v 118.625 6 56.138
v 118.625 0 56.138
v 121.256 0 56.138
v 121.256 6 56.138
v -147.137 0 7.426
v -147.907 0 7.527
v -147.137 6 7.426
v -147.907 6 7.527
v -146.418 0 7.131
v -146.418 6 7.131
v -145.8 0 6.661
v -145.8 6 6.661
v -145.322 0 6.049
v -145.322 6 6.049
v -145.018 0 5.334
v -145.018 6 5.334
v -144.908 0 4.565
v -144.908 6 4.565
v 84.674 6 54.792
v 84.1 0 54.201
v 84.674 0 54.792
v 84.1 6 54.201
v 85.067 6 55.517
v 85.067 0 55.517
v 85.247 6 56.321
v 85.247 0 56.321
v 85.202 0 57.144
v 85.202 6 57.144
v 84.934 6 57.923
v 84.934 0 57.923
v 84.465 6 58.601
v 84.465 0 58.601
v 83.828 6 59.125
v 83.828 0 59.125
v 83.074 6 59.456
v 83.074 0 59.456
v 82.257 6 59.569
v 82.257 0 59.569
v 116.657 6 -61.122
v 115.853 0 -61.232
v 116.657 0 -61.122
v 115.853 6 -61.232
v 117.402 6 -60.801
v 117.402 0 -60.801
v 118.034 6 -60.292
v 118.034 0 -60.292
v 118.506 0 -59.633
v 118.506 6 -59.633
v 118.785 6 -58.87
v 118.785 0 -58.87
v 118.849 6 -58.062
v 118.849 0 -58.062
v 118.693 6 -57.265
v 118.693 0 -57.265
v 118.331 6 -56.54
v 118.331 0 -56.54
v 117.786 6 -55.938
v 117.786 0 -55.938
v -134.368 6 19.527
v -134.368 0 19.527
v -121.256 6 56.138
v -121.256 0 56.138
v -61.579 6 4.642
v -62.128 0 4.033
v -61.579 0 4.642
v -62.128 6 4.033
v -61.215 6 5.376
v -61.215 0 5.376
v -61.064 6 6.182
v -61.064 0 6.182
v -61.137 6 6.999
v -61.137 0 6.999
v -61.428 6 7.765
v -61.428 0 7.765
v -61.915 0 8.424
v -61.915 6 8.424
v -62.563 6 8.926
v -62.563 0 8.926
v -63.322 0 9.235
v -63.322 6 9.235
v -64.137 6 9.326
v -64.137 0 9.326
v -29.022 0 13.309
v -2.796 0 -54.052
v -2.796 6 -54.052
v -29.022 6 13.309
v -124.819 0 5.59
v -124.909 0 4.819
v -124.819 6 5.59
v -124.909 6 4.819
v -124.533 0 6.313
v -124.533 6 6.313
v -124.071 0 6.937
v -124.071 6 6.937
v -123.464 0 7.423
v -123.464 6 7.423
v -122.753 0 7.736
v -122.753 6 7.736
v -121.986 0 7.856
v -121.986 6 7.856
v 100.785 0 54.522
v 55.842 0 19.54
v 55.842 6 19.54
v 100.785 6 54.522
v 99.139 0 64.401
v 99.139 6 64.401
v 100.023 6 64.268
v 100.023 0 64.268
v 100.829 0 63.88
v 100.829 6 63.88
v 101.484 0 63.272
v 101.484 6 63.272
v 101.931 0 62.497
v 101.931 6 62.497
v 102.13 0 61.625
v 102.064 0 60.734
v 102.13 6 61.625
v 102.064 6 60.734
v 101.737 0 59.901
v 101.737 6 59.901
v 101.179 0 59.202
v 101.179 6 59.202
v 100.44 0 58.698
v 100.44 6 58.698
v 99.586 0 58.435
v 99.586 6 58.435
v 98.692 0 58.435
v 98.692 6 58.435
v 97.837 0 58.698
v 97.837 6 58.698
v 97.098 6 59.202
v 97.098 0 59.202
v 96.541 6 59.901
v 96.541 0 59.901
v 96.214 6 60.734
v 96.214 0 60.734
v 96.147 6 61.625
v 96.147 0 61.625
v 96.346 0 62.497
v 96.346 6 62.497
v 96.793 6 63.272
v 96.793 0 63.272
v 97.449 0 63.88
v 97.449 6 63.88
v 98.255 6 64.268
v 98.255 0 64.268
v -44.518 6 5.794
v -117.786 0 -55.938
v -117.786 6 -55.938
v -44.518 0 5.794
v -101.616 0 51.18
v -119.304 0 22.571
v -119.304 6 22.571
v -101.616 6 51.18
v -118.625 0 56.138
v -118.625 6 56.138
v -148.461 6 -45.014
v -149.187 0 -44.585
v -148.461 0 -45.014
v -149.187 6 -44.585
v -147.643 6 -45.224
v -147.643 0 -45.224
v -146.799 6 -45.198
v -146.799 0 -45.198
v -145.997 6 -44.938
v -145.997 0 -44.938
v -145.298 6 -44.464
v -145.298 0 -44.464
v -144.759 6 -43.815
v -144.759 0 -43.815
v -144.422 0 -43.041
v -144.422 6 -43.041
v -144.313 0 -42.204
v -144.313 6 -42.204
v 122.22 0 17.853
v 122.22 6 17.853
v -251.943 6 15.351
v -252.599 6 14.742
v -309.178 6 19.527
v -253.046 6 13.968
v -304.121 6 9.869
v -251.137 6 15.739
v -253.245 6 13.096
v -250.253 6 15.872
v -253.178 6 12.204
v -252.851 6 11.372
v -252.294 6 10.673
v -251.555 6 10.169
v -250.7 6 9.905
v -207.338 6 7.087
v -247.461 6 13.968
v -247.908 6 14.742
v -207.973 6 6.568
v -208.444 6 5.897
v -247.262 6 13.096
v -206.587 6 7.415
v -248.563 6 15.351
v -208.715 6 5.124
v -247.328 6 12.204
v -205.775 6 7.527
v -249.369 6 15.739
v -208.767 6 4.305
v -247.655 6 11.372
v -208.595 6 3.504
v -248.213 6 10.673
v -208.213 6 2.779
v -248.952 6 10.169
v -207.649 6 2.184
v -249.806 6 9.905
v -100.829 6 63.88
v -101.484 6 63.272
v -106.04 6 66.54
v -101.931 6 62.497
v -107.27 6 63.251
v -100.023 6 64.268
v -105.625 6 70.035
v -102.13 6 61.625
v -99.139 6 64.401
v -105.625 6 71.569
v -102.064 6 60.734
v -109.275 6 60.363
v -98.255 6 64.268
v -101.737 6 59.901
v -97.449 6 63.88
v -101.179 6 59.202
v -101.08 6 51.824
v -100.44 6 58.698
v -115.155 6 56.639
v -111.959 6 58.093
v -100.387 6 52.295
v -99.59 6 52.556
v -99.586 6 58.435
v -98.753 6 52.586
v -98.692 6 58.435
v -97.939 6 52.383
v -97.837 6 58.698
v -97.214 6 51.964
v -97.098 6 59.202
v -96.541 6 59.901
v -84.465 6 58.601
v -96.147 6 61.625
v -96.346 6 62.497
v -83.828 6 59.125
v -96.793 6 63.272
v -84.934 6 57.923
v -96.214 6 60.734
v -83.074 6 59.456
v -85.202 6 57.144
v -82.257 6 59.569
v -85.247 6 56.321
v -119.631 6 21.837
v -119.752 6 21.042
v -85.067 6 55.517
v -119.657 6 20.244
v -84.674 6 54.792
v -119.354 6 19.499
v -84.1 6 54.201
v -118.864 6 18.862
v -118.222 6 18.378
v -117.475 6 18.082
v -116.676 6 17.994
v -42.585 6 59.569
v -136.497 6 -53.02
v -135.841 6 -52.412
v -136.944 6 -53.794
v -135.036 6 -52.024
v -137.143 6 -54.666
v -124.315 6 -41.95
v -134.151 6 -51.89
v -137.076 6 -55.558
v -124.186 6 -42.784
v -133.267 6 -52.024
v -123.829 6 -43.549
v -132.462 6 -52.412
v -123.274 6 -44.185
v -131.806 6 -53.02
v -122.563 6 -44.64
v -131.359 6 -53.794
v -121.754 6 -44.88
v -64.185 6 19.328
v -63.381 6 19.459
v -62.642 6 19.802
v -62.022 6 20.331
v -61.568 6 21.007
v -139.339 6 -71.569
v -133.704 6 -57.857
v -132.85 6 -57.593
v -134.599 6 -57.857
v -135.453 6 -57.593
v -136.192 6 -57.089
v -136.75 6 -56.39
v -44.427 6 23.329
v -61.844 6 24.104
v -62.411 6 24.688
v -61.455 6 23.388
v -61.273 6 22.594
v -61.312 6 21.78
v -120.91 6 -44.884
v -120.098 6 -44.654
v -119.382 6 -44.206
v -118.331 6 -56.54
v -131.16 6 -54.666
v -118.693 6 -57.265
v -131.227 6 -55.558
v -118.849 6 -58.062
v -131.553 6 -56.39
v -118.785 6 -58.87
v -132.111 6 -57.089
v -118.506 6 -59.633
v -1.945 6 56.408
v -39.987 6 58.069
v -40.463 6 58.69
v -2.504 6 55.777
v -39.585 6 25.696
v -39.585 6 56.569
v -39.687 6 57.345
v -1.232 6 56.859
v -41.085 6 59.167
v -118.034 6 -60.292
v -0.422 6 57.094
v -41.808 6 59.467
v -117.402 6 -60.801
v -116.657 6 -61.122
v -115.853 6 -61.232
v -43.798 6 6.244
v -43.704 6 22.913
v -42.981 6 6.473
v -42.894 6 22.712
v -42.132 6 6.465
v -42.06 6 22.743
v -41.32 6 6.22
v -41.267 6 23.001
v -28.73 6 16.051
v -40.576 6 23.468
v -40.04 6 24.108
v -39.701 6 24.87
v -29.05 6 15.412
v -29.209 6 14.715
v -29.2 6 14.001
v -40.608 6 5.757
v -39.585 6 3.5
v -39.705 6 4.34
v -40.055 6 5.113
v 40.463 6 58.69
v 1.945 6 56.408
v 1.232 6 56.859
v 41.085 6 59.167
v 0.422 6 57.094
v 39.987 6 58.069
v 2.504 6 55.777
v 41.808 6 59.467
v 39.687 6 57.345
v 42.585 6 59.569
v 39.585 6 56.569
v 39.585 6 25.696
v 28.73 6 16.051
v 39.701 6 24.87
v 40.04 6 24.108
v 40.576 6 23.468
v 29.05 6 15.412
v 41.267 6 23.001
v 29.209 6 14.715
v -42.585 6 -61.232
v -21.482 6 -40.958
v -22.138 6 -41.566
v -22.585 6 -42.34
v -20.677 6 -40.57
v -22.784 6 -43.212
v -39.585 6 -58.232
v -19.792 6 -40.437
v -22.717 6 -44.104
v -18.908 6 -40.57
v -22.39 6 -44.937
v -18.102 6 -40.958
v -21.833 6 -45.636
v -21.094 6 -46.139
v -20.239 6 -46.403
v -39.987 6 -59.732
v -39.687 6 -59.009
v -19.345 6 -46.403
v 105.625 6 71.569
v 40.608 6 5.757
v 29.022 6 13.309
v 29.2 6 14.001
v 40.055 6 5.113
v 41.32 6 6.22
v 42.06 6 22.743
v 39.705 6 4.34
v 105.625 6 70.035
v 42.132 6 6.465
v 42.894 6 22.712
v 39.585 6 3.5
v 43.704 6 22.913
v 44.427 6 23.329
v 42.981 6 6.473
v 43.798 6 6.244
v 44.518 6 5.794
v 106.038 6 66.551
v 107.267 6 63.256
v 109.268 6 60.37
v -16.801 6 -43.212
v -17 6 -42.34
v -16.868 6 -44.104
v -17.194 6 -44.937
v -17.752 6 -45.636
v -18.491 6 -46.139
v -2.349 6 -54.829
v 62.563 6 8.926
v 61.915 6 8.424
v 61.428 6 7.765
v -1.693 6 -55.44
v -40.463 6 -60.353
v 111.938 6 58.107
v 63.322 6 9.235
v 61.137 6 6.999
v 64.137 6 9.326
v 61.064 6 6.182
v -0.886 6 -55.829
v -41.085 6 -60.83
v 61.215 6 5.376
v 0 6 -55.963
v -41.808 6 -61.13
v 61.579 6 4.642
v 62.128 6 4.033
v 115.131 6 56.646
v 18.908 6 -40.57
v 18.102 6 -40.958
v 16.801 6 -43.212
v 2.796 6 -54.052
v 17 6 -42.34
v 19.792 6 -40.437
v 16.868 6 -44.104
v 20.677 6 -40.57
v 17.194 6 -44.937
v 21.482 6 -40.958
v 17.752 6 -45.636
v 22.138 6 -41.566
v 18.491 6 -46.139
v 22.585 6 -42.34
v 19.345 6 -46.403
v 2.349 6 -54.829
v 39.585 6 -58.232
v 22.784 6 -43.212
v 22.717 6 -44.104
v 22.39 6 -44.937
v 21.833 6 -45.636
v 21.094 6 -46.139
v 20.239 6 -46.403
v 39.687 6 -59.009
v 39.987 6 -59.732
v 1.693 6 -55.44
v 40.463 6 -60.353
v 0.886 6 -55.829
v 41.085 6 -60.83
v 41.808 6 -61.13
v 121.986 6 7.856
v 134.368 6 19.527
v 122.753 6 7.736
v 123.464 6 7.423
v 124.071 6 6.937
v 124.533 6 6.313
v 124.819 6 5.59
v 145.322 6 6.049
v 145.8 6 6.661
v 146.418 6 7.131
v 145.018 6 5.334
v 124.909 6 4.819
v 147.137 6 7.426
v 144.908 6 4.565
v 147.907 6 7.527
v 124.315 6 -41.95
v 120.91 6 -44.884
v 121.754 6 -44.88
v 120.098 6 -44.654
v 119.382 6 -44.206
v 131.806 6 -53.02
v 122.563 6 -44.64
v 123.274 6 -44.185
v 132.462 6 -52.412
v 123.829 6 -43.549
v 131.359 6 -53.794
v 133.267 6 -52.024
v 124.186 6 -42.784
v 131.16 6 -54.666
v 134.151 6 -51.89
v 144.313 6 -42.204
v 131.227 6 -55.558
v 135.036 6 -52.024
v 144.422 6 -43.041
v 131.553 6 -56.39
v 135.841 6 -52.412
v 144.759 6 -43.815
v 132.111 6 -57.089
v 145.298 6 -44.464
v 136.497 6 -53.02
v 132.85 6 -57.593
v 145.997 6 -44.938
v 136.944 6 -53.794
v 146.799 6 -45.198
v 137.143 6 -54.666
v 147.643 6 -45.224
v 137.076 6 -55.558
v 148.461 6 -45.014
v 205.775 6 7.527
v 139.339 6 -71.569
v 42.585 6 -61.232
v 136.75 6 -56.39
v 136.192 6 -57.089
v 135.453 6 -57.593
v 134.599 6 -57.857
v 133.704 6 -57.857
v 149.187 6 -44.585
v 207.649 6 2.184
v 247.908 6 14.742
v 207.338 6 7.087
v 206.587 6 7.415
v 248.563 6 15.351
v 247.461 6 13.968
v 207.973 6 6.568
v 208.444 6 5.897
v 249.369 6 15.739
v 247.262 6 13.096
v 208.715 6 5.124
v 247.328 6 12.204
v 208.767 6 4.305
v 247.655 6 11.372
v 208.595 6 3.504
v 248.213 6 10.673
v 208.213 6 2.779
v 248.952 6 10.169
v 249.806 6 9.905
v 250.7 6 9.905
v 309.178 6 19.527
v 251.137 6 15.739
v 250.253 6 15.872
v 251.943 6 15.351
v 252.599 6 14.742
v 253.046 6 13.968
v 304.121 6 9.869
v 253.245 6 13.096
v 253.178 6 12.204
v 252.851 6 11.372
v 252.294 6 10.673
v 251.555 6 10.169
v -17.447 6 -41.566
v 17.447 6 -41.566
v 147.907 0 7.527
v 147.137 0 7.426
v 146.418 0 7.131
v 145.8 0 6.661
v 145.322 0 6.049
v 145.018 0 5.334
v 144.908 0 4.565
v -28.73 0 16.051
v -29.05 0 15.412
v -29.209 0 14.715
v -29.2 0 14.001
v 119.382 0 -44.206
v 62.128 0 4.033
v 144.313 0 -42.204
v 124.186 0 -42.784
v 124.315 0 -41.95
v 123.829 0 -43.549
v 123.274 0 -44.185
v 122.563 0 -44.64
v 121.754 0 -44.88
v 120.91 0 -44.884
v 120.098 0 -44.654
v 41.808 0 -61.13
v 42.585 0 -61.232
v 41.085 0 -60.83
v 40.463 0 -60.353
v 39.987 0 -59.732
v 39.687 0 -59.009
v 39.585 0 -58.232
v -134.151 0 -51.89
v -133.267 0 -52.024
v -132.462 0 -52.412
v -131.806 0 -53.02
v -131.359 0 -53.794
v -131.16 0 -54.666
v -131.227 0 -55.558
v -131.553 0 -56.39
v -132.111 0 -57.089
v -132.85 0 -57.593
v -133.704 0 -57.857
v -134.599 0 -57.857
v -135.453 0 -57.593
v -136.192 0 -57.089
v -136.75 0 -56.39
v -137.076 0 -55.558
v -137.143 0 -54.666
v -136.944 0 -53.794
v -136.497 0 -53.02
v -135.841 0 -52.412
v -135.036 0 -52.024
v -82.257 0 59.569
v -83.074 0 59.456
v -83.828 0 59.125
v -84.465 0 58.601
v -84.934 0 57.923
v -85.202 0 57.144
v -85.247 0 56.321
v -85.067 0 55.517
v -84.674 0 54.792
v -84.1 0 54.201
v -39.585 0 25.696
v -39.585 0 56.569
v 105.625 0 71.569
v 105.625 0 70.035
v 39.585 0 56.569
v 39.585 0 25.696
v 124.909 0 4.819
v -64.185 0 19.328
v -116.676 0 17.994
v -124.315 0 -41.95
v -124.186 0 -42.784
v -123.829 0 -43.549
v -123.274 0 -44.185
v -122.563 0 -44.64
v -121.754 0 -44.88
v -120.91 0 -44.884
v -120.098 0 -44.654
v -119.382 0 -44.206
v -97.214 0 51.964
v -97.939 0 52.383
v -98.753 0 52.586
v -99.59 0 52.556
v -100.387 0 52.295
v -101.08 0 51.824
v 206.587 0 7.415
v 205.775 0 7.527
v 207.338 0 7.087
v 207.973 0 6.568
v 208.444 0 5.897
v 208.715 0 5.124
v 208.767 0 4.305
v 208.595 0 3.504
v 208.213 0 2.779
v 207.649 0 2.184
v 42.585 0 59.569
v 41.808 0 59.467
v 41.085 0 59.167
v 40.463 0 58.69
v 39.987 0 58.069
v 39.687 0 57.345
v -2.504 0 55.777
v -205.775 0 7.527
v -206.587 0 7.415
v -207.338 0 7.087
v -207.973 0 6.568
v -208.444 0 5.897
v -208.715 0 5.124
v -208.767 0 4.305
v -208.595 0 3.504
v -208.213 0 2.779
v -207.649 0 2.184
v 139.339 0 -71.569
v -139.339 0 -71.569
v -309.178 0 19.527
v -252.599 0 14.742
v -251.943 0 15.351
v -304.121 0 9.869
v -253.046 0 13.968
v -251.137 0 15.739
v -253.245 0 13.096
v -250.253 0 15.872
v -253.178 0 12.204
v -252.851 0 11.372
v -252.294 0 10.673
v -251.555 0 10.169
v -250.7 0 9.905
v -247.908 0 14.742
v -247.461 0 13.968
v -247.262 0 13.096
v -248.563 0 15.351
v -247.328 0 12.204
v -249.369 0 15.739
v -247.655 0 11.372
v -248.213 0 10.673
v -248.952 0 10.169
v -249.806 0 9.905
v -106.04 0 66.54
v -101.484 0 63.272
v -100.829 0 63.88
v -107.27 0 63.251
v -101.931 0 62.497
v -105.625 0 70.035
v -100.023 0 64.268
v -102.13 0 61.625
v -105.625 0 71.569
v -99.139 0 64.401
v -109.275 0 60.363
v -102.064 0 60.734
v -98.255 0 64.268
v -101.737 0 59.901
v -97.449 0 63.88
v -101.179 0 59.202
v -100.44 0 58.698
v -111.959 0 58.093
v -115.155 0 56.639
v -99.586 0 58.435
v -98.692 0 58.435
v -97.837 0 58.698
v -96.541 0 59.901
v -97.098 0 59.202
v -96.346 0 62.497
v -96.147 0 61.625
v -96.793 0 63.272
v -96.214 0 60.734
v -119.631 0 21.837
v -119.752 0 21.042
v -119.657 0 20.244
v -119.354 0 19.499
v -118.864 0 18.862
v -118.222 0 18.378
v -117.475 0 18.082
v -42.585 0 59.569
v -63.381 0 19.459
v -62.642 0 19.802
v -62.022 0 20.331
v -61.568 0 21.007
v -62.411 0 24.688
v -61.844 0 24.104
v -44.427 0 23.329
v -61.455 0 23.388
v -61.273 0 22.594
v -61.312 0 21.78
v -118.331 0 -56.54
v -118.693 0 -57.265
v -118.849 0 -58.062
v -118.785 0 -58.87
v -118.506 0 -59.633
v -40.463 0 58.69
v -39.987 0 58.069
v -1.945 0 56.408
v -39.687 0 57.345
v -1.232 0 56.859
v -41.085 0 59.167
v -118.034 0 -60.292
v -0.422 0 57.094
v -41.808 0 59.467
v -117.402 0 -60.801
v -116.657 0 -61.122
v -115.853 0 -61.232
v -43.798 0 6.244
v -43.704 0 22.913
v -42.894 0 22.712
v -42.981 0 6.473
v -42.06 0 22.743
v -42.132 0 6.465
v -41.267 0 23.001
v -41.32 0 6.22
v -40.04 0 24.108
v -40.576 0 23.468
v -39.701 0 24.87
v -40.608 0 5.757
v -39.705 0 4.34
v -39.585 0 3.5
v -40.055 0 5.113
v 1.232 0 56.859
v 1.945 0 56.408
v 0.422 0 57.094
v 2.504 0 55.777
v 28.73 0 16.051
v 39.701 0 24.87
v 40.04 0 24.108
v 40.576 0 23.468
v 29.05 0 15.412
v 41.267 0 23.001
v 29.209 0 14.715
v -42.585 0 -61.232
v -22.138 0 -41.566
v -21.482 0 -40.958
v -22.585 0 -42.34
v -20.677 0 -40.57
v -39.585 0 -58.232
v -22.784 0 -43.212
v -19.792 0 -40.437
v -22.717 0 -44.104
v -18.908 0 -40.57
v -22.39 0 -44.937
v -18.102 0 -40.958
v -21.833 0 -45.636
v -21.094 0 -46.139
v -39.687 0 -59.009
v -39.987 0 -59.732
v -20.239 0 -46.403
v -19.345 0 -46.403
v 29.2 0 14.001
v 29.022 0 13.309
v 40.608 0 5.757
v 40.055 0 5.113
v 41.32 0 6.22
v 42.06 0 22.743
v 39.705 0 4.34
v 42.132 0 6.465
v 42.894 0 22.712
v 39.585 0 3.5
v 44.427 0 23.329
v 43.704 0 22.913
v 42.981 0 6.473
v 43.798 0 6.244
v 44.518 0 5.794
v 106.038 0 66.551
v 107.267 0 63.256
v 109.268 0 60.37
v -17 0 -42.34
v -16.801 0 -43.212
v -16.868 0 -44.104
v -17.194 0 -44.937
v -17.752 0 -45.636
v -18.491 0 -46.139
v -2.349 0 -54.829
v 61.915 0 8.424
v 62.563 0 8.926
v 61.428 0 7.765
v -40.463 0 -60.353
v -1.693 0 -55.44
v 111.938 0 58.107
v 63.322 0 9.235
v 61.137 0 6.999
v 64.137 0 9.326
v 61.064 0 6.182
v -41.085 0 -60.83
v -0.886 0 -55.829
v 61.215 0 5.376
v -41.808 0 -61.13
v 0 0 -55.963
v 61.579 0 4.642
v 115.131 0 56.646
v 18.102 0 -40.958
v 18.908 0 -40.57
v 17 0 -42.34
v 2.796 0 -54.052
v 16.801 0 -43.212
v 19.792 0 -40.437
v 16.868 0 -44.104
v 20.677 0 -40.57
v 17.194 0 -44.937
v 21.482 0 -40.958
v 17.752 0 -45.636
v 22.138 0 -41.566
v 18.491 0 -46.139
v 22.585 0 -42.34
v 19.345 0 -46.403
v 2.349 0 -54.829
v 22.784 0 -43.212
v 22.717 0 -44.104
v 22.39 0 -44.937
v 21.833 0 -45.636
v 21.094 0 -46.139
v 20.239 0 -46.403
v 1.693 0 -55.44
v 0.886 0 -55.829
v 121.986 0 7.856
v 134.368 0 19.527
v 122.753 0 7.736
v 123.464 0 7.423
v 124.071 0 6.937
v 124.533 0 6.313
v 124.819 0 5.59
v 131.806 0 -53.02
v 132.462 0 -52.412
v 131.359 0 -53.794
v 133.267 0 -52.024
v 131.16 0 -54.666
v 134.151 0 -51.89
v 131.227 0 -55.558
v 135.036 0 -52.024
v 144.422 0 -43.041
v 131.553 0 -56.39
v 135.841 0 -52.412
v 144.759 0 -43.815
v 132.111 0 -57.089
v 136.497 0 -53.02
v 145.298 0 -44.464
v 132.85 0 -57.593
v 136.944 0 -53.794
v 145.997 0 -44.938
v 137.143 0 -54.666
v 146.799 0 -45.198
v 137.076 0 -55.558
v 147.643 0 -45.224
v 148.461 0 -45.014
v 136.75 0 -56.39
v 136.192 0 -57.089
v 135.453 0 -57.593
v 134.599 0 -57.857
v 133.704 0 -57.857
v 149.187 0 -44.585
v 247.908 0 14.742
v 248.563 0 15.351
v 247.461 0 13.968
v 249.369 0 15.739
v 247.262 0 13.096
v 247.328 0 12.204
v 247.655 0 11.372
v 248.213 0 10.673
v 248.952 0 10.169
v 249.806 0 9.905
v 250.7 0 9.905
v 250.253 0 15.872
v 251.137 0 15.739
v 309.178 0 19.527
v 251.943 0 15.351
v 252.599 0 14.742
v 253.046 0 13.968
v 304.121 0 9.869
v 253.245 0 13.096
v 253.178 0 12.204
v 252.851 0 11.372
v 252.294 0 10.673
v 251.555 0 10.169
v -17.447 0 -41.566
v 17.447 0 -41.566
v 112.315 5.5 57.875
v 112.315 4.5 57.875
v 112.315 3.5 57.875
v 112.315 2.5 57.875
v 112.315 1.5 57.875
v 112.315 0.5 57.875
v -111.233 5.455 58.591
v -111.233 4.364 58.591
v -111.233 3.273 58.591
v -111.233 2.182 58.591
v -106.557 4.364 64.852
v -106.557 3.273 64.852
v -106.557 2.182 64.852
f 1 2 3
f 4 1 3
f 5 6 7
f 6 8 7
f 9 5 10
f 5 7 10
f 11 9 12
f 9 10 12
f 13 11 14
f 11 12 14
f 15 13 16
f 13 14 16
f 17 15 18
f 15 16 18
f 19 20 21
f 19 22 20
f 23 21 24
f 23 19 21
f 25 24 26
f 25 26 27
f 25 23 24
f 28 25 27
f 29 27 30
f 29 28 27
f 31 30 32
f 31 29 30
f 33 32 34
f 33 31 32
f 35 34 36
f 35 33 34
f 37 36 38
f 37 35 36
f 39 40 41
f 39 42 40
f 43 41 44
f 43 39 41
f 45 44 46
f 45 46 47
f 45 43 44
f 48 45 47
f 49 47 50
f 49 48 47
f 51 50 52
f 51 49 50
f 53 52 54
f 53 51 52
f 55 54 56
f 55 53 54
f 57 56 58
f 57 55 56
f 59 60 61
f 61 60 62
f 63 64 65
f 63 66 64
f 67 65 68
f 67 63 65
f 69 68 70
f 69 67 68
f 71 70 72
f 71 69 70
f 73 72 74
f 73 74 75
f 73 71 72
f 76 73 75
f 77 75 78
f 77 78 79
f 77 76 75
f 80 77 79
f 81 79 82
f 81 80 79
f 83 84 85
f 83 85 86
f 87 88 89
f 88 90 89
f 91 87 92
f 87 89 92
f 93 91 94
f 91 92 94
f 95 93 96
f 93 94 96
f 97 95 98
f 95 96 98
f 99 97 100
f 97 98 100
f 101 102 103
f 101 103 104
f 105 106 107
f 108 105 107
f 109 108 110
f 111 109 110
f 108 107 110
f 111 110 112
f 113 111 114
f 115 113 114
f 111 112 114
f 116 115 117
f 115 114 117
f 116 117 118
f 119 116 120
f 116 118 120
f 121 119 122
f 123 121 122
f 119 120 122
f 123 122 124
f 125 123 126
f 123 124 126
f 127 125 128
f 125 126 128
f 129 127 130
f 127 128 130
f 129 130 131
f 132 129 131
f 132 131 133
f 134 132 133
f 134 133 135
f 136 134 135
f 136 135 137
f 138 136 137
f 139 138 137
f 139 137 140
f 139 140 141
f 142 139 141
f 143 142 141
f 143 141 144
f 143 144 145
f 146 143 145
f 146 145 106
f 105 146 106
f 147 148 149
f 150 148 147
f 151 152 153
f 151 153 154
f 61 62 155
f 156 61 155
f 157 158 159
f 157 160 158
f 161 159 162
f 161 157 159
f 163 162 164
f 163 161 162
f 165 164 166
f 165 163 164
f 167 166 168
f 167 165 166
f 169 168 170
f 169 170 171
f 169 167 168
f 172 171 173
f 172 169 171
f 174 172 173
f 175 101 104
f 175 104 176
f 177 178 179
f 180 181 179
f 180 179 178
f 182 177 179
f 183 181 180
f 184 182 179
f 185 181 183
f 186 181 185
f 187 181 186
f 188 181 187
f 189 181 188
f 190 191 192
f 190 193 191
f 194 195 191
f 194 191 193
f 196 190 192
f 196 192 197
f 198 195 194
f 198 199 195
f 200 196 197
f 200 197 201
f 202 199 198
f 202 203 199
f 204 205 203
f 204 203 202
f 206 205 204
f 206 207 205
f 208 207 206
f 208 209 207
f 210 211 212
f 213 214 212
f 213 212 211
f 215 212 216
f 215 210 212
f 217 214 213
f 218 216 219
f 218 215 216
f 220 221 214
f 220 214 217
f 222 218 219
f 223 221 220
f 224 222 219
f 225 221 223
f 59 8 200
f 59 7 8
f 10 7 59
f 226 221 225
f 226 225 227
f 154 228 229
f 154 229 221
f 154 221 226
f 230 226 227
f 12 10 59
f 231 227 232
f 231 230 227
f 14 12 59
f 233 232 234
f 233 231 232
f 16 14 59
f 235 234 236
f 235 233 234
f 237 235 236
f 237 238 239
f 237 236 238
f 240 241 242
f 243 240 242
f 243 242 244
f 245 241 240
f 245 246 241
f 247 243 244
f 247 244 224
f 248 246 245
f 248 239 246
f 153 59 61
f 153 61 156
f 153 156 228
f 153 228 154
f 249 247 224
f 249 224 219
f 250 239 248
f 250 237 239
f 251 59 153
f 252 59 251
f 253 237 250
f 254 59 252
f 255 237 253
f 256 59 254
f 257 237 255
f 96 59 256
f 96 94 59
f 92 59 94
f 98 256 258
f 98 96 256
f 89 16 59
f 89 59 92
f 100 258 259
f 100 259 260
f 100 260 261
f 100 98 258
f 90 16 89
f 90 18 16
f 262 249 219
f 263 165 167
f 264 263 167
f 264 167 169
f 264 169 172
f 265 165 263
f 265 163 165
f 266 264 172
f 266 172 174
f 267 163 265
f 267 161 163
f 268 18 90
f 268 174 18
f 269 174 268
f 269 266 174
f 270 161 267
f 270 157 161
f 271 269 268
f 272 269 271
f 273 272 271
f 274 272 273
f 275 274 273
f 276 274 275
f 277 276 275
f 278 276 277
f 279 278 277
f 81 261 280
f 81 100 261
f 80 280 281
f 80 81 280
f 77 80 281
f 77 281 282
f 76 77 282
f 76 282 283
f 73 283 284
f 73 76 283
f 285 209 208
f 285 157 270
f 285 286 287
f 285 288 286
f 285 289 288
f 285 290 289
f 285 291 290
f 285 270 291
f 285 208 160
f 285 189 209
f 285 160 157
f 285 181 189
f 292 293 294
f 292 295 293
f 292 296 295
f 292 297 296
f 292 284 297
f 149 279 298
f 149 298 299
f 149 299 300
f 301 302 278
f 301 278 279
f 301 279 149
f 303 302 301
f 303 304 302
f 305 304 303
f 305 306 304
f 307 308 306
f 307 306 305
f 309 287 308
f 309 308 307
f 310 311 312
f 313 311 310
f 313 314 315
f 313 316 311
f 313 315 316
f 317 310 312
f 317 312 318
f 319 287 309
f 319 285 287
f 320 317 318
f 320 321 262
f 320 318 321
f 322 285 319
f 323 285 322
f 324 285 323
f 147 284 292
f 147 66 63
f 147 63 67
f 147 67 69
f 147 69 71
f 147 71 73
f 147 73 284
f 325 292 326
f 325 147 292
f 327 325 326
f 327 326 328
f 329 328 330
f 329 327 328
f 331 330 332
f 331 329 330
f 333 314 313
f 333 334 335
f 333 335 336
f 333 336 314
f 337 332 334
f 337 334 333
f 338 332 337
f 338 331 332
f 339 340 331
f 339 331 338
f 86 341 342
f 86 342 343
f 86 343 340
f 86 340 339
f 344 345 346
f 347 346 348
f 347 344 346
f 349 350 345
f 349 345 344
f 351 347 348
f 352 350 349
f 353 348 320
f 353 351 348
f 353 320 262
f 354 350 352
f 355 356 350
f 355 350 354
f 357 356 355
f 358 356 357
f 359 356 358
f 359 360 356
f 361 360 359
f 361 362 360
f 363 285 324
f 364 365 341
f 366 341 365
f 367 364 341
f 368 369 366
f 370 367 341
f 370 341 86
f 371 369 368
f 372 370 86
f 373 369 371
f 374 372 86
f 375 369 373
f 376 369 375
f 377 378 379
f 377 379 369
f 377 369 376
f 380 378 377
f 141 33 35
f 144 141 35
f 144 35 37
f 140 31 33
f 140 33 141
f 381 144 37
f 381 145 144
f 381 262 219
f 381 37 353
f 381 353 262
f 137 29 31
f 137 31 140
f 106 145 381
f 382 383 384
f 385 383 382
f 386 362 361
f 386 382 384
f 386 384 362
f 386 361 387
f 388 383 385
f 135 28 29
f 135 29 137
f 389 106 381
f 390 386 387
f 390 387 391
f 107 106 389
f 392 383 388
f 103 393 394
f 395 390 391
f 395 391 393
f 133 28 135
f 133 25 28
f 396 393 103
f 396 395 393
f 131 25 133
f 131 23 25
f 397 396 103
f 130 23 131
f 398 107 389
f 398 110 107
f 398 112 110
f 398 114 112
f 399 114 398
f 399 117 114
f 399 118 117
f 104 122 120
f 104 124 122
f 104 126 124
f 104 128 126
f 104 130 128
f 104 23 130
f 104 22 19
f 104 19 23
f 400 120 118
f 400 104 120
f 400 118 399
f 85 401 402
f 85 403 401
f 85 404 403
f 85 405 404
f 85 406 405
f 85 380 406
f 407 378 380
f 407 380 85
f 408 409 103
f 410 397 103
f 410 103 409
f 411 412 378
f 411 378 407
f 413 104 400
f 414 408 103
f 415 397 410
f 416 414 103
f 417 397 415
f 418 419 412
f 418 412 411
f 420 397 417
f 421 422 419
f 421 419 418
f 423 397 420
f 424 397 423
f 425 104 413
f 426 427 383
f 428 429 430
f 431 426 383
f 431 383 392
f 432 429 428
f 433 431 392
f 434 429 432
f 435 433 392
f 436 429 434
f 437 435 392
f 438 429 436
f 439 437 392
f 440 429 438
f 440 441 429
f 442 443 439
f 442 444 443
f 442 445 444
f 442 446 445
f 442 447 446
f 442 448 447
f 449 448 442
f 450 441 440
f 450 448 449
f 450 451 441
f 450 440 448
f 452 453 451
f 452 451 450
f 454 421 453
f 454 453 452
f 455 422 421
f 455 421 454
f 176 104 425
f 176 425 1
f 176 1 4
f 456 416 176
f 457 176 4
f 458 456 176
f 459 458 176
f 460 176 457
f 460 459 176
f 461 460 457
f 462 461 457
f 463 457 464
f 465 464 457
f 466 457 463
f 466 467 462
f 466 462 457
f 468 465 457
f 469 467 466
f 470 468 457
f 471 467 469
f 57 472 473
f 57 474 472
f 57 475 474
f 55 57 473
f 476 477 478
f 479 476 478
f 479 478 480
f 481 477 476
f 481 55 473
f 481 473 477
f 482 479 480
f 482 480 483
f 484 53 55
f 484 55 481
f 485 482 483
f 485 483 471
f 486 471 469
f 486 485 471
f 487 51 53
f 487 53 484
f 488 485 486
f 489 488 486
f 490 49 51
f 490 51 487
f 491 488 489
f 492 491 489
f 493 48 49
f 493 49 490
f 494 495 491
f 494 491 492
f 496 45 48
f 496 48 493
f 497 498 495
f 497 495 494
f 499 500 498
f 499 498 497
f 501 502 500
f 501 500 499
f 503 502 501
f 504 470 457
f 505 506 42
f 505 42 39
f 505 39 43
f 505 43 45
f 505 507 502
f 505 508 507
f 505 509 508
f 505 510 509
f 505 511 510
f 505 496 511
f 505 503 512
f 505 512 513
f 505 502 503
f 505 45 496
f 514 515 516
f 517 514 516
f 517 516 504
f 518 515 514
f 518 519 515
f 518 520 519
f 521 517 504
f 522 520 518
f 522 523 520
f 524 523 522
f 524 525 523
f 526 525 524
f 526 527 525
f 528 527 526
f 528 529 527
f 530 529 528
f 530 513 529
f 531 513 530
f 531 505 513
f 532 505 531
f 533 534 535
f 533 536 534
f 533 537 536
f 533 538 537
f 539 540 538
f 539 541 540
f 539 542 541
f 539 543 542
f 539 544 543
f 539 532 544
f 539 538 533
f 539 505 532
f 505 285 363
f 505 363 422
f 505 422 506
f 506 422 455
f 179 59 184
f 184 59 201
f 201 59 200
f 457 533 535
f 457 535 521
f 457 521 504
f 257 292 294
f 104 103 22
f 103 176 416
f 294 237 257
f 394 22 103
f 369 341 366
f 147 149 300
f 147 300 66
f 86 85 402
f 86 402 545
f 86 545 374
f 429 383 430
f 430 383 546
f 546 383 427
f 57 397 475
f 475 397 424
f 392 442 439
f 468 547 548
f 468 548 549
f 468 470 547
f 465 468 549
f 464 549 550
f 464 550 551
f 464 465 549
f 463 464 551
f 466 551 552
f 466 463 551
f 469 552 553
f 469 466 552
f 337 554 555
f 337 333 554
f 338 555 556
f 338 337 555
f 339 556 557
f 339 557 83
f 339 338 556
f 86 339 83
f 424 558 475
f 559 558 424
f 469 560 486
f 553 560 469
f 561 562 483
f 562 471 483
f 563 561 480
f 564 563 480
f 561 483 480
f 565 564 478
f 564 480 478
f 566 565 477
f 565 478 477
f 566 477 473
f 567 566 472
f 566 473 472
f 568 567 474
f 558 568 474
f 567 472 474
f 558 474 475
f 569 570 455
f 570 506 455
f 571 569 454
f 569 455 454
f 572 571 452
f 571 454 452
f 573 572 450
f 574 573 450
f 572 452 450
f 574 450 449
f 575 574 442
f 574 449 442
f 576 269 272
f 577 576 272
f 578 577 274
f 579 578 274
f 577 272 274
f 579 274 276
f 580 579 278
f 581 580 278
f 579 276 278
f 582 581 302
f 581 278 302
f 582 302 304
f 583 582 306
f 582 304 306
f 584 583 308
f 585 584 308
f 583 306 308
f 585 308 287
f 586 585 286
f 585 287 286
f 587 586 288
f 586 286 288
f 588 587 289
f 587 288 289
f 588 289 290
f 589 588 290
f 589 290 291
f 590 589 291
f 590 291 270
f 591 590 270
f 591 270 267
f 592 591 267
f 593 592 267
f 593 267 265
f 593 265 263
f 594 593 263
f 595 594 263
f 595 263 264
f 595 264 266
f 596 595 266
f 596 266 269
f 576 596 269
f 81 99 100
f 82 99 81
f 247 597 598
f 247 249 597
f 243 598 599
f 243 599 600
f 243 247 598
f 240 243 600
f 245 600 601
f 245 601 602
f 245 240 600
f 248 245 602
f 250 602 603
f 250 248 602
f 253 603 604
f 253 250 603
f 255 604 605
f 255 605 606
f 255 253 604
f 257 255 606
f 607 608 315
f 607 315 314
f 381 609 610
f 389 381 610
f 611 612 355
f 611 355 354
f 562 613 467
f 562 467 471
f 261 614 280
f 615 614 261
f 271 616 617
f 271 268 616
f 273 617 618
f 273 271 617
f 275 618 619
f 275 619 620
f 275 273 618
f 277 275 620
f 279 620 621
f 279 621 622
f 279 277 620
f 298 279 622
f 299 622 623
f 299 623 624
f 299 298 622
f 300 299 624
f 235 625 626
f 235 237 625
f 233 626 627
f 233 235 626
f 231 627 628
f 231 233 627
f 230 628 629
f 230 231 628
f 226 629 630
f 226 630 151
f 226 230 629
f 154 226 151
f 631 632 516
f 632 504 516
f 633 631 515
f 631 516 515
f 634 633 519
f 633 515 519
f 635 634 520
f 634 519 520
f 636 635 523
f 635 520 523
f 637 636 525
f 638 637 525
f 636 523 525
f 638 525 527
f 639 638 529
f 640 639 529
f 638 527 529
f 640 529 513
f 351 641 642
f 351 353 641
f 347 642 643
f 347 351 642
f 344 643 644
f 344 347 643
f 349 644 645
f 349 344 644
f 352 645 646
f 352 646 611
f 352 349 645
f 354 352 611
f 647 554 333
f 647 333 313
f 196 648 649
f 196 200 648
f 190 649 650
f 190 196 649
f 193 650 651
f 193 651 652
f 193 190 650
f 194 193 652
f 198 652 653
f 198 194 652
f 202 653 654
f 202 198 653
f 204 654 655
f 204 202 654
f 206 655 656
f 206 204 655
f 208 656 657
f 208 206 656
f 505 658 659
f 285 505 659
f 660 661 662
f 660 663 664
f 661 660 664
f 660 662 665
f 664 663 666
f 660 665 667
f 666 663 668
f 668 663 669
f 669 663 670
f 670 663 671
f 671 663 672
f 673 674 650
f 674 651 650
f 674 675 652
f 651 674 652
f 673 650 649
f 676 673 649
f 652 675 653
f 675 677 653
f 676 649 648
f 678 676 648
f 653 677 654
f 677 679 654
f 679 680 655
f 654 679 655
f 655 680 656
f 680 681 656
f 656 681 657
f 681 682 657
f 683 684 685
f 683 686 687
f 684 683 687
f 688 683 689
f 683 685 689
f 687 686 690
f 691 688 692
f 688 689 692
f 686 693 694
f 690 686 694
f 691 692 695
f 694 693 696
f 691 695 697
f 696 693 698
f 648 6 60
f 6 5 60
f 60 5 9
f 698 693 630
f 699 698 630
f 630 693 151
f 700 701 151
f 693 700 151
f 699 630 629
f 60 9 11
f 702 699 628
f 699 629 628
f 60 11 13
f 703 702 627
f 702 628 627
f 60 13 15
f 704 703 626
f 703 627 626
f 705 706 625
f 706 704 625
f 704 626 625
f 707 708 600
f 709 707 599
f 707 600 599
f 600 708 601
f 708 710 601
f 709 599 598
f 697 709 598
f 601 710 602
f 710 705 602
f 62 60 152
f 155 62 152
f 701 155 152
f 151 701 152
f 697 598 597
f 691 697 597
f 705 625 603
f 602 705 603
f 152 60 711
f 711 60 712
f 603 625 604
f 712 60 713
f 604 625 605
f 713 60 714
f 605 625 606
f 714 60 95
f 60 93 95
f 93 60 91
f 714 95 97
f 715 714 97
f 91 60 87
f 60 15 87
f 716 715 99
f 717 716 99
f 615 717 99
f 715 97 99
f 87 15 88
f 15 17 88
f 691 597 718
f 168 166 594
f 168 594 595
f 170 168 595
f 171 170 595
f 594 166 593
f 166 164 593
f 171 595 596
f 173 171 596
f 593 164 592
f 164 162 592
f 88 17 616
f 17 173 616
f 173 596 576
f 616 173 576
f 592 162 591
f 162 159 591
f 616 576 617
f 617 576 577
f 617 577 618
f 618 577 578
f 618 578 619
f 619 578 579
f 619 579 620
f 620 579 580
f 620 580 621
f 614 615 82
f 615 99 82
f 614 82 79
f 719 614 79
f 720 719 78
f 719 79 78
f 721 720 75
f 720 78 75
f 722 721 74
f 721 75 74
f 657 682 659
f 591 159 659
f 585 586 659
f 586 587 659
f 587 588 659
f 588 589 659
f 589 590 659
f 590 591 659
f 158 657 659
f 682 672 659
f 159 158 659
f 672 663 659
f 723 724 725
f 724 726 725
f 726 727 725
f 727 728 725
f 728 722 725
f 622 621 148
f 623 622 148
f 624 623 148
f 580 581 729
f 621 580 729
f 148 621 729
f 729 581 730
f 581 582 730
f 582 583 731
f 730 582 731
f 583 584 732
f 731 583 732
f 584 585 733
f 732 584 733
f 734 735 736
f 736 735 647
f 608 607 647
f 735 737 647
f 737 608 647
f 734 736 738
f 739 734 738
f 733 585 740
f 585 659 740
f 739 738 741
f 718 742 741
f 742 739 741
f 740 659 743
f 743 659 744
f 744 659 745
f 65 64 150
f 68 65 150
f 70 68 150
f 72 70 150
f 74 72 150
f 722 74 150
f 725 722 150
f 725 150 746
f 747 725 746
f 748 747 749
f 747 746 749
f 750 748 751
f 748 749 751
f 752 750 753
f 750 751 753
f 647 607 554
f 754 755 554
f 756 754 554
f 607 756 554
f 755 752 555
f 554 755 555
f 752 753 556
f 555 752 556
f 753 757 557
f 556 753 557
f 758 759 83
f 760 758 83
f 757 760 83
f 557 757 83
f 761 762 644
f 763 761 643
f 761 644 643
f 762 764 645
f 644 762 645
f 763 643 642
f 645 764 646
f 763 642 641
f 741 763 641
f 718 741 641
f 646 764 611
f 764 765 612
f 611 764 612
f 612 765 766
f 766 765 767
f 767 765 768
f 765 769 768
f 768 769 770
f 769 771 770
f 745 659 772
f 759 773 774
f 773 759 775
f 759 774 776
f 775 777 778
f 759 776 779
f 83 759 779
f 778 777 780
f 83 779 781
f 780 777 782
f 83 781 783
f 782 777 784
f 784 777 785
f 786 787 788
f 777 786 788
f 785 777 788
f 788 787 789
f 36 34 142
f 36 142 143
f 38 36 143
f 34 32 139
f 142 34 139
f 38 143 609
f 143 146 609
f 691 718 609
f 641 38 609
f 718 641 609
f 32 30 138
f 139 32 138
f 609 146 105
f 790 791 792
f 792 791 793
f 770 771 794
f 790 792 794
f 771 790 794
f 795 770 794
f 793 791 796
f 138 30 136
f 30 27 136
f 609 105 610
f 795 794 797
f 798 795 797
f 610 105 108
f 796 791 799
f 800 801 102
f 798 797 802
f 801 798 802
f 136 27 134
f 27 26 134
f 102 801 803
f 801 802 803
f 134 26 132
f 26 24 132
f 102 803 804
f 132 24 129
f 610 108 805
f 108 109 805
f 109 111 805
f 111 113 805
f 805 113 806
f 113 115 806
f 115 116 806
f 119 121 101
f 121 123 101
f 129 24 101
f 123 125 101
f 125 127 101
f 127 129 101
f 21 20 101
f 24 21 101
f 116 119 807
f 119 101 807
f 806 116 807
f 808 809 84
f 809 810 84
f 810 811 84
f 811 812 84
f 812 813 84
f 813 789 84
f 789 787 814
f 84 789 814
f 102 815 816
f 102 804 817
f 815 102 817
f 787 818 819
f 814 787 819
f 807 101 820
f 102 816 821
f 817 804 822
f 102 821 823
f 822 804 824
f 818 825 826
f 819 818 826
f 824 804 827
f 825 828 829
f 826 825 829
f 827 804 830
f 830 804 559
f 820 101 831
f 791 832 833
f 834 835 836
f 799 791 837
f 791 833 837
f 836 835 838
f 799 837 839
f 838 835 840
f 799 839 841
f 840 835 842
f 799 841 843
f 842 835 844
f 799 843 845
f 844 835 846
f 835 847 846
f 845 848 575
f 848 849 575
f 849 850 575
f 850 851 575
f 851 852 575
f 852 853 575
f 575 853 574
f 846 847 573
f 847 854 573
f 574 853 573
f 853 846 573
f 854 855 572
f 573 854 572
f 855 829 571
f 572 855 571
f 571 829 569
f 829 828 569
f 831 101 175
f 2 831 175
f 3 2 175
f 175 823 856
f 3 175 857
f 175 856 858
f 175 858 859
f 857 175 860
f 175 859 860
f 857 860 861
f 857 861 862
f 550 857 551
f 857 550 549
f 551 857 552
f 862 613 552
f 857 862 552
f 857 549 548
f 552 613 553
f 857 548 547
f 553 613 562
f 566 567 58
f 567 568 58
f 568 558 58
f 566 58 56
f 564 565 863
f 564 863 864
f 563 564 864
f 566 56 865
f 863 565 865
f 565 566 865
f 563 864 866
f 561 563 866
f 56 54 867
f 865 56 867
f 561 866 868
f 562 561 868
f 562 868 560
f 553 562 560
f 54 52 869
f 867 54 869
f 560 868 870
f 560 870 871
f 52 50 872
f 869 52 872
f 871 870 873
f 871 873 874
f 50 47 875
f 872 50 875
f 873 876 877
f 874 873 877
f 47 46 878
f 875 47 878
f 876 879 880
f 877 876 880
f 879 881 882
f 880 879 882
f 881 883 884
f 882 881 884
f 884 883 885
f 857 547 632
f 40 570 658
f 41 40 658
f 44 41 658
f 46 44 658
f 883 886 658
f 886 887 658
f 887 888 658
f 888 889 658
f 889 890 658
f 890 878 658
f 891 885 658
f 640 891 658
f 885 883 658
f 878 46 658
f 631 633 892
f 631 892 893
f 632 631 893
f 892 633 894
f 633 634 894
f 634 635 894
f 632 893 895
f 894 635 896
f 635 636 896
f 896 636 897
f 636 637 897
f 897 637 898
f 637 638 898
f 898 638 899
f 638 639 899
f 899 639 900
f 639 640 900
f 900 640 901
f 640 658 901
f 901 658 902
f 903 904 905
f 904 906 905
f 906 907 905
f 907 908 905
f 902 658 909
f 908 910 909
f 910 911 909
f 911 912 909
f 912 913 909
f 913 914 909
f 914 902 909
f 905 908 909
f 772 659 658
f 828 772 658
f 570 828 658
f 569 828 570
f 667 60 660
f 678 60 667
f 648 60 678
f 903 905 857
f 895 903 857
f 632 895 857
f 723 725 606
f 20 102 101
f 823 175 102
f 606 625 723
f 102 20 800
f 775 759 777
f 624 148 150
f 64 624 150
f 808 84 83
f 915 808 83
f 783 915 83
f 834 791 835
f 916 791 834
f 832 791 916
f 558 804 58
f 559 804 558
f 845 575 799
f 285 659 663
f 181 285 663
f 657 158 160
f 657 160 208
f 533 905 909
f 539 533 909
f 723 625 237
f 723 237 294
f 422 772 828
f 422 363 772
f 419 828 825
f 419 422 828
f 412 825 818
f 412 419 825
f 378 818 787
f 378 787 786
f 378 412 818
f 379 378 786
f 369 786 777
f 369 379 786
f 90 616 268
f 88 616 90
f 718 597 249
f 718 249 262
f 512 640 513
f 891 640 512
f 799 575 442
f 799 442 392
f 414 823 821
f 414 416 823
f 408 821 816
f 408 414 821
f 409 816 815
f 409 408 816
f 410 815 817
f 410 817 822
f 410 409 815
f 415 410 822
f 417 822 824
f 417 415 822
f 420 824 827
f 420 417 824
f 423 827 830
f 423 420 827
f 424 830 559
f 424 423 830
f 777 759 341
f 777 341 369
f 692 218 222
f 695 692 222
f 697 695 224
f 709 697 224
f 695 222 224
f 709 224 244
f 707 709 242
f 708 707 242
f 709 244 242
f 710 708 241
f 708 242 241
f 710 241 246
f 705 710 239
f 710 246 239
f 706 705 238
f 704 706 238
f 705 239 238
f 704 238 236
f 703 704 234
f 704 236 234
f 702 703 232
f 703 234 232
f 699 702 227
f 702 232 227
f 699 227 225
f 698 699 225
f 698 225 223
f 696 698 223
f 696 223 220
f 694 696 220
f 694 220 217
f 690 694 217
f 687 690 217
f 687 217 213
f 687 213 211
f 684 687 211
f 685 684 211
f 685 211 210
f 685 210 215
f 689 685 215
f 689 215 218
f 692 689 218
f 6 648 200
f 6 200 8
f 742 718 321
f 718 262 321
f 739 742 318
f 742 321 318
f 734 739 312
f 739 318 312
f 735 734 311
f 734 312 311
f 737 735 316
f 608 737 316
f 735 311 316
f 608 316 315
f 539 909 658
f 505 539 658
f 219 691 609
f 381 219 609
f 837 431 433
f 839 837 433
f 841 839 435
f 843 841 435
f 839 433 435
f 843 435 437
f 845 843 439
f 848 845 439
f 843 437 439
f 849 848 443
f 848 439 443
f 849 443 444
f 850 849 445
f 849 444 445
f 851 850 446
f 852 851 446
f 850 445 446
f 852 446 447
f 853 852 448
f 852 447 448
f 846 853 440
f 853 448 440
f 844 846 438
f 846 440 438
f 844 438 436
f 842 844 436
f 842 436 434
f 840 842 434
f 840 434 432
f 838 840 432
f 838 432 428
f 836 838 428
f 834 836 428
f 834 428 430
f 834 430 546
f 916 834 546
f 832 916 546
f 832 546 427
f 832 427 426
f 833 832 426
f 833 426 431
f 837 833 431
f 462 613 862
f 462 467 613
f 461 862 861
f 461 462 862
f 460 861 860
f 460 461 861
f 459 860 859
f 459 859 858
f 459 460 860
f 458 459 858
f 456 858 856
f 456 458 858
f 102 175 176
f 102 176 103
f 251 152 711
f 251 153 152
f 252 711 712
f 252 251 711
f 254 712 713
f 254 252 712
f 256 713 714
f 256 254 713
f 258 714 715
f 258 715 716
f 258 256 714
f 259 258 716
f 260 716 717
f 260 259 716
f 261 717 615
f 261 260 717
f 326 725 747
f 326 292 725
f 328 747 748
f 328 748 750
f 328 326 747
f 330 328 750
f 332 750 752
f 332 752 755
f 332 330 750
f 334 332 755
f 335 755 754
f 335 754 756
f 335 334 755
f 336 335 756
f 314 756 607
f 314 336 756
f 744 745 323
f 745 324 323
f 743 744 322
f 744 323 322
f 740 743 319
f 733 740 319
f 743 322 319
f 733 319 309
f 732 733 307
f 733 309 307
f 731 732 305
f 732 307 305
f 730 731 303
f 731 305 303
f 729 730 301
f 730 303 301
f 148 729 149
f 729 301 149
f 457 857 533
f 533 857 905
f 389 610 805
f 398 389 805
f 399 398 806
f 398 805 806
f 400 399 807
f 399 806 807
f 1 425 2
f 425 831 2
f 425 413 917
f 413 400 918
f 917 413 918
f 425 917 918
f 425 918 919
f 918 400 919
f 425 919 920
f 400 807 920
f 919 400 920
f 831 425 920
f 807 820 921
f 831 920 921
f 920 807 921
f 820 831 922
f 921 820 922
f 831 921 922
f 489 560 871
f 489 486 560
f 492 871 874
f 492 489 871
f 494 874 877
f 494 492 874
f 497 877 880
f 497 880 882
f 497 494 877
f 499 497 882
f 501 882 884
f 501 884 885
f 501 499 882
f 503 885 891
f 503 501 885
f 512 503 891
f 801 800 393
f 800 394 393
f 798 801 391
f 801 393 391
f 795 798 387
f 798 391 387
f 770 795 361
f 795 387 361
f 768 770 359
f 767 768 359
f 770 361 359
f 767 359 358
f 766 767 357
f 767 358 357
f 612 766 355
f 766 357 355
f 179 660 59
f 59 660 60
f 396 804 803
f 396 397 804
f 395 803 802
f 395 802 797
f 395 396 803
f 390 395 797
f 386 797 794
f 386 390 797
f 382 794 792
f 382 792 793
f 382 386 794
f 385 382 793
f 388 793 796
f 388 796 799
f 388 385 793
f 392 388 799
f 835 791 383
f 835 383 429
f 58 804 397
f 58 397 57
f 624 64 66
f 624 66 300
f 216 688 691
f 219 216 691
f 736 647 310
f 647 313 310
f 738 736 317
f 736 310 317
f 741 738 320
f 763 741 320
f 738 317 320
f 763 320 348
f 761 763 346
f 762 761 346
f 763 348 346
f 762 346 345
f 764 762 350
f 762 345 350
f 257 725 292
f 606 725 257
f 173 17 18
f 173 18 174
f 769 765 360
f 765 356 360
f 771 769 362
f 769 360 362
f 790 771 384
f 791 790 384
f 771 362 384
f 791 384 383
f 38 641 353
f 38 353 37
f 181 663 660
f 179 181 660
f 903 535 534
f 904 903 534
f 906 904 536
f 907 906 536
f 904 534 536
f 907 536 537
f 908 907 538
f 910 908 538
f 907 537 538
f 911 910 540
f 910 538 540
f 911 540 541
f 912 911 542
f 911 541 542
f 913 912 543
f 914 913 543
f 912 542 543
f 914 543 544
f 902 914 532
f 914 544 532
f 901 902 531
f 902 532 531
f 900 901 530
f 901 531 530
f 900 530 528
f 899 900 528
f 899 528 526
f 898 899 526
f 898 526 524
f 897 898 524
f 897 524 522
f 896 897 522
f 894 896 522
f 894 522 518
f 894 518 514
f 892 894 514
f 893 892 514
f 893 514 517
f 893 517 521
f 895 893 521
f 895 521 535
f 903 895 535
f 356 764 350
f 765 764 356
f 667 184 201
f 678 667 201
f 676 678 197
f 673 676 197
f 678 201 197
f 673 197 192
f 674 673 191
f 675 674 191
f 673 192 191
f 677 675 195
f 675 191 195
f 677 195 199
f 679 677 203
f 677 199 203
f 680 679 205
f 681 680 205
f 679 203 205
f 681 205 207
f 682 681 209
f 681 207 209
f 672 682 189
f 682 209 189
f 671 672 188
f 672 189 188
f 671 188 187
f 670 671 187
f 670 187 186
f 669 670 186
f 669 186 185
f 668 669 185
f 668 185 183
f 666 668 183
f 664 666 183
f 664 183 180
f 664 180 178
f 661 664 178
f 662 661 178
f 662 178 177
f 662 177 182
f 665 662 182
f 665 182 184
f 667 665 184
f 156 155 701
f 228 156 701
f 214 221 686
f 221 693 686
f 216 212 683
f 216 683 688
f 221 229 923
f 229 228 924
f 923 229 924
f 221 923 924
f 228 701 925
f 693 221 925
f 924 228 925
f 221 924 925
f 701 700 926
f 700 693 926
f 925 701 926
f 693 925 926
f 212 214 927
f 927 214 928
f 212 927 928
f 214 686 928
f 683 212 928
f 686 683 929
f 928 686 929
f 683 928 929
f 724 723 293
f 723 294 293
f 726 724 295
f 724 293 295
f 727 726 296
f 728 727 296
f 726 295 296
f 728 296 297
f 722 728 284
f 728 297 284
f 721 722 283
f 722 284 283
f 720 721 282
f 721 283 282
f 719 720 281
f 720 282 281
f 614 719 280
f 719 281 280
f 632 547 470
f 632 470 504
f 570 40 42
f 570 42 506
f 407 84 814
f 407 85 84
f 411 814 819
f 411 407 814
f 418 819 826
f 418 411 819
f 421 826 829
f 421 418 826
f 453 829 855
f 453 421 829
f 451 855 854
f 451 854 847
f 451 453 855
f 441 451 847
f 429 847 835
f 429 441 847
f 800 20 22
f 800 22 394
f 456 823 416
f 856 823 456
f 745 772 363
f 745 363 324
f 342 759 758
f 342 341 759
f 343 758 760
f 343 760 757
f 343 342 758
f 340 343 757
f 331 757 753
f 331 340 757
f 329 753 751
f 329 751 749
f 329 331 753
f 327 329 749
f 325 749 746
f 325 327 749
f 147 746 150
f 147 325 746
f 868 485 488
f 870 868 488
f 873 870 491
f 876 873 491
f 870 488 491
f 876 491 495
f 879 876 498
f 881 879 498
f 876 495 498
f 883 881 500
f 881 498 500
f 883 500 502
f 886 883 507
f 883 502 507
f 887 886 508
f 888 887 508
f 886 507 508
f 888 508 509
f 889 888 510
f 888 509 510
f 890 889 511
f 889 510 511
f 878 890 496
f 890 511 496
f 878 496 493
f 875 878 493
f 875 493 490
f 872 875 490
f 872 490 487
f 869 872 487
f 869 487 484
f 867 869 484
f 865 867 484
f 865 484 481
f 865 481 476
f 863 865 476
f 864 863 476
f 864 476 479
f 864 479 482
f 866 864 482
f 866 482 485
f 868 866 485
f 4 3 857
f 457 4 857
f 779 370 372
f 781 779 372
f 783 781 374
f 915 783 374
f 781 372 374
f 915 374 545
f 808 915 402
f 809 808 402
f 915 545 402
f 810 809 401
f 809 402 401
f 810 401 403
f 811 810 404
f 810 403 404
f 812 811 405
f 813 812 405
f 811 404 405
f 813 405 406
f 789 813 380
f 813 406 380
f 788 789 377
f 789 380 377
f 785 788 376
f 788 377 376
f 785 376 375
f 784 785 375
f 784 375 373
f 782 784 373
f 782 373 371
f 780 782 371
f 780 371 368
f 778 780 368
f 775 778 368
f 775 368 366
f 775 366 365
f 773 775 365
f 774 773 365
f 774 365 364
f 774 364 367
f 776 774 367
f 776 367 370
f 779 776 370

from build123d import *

# Parameters (mm, degrees)
EXTRUDE_1_DEPTH     = 6
SKETCH_2_R          = 3
CUT_EXTRUDE_1_DEPTH = 318.409896722
FILLET_1_R          = 3


with BuildPart() as part:
    # Эскиз1 → Бобышка-Вытянуть1 (new body)
    with BuildSketch(Plane(origin=(0, 0, 0), x_dir=(1, 0, 0), z_dir=(0, 1, 0))):
        with BuildLine():
            Line((309.177837991, -19.526563843), (304.1208994, -9.869304954))
            Line((304.1208994, -9.869304954), (139.339108595, 71.568896564))
            Line((139.339108595, 71.568896564), (-139.339108595, 71.568896564))
            Line((-139.339108595, 71.568896564), (-304.1208994, -9.869304954))
            Line((-304.1208994, -9.869304954), (-309.177837991, -19.526563843))
            Line((-309.177837991, -19.526563843), (-134.367548184, -19.526563843))
            Line((-134.367548184, -19.526563843), (-121.255506601, -56.137850168))
            Line((-121.255506601, -56.137850168), (-118.625, -56.137850168))
            add(Edge.make_bspline(
                [(-118.625, -56.137850168), (-117.73604939, -56.137850168), (-116.863581866, -56.233656219), (-115.578458559, -56.514409609), (-115.154045806, -56.631020903), (-114.313330245, -56.91138161), (-113.900260231, -57.074299025), (-112.700337662, -57.62175838), (-111.944761063, -58.066913832), (-110.877012416, -58.853219635), (-110.532359667, -59.135456666), (-109.879727858, -59.72693005), (-109.259674848, -60.348234431), (-108.702715184, -61.027310664), (-108.177181377, -61.735162196), (-107.929156775, -62.105311768), (-107.245045383, -63.239220647), (-106.864936074, -64.029470546), (-106.249383942, -65.67531101), (-106.013919219, -66.536987879), (-105.703263791, -68.270165649), (-105.625, -69.14709382), (-105.625, -70.034522256)],
                knots=[0, 0, 0, 0, 0.125, 0.125, 0.1875, 0.1875, 0.25, 0.25, 0.375, 0.375, 0.4375, 0.4375, 0.5, 0.5625, 0.5625, 0.625, 0.625, 0.75, 0.75, 0.875, 0.875, 1, 1, 1, 1], degree=3))
            Line((-105.625, -70.034522256), (-105.625, -71.568896564))
            Line((-105.625, -71.568896564), (105.625, -71.568896564))
            Line((105.625, -71.568896564), (105.625, -70.034522256))
            add(Edge.make_bspline(
                [(105.625, -70.034522256), (105.625, -69.146188417), (105.703417019, -68.271043449), (105.934814701, -66.977461208), (106.031042325, -66.549478705), (106.262646487, -65.700098111), (106.398816423, -65.276664427), (106.863134882, -64.032516396), (107.243720136, -63.242761719), (107.92127714, -62.117712579), (108.165026803, -61.75269229), (108.68986891, -61.043508559), (108.97254159, -60.69784736), (109.860275675, -59.715540738), (110.508242307, -59.12685949), (111.565919809, -58.344904551), (111.932862686, -58.101210315), (112.6970874, -57.649589406), (113.090639287, -57.444106887), (114.289999629, -56.895653779), (115.12040105, -56.616320302), (116.41376972, -56.331041481), (116.854501373, -56.258404071), (117.736783928, -56.162064753), (118.179895928, -56.137850168), (118.625, -56.137850168)],
                knots=[0, 0, 0, 0, 0.125, 0.125, 0.1875, 0.1875, 0.25, 0.25, 0.375, 0.375, 0.4375, 0.4375, 0.5, 0.5, 0.625, 0.625, 0.6875, 0.6875, 0.75, 0.75, 0.875, 0.875, 0.9375, 0.9375, 1, 1, 1, 1], degree=3))
            Line((118.625, -56.137850168), (121.255506601, -56.137850168))
            Line((121.255506601, -56.137850168), (134.367548184, -19.526563843))
            Line((134.367548184, -19.526563843), (309.177837991, -19.526563843))
        make_face()
        Polygon((-214.327282353, -7.526563843), (-144.945354376, -7.526563843), (-144.232879574, 48.548456393), align=None, mode=Mode.SUBTRACT)
        Polygon((-124.234493737, 48.29436204), (-124.94696854, -7.780658197), (-55.587438417, -9.543471524), align=None, mode=Mode.SUBTRACT)
        Polygon((-39.584708108, 61.232071167), (-124.070110529, 61.232071167), (-39.584708108, -9.950190344), align=None, mode=Mode.SUBTRACT)
        Polygon((-29.584708108, -14.755399706), (0, -59.568896564), (29.584708108, -14.755399706), (0, 61.232071167), align=None, mode=Mode.SUBTRACT)
        Polygon((-90.997346953, -59.568896564), (-39.584708108, -59.568896564), (-39.584708108, -19.560609068), align=None, mode=Mode.SUBTRACT)
        Polygon((-99.853084476, -54.031919172), (-55.841512263, -19.540243327), (-122.220473813, -17.853182906), align=None, mode=Mode.SUBTRACT)
        Polygon((124.070110529, 61.232071167), (39.584708108, 61.232071167), (39.584708108, -9.950190344), align=None, mode=Mode.SUBTRACT)
        Polygon((124.94696854, -7.780658197), (124.234493737, 48.29436204), (55.587438417, -9.543471524), align=None, mode=Mode.SUBTRACT)
        Polygon((100.785410724, -54.522211893), (122.220473813, -17.853182906), (55.841512263, -19.540243327), align=None, mode=Mode.SUBTRACT)
        Polygon((90.997346953, -59.568896564), (39.584708108, -19.560609068), (39.584708108, -59.568896564), align=None, mode=Mode.SUBTRACT)
        Polygon((144.945354376, -7.526563843), (214.327282353, -7.526563843), (144.232879574, 48.548456393), align=None, mode=Mode.SUBTRACT)
    extrude(amount=EXTRUDE_1_DEPTH)

    # Эскиз2 → Вырез-Вытянуть1 (cut, through all)
    with BuildSketch(Plane(origin=(0, 6, 0), x_dir=(1, 0, 0), z_dir=(0, 1, 0))):
        with Locations(Location((-250.253196754, -12.871881409, 0), (0, 0, 270))):
            Circle(SKETCH_2_R)
        with Locations(Location((-134.151495051, 54.89026378, 0), (0, 0, 270))):
            Circle(SKETCH_2_R)
        with Locations(Location((-99.138834526, -61.401125149, 0), (0, 0, 270))):
            Circle(SKETCH_2_R)
        with Locations(Location((-19.792354054, 43.436505789, 0), (0, 0, 270))):
            Circle(SKETCH_2_R)
        with Locations(Location((19.792354054, 43.436505789, 0), (0, 0, 270))):
            Circle(SKETCH_2_R)
        with Locations(Location((99.138834526, -61.401125149, 0), (0, 0, 270))):
            Circle(SKETCH_2_R)
        with Locations(Location((134.151495051, 54.89026378, 0), (0, 0, 270))):
            Circle(SKETCH_2_R)
        with Locations(Location((250.253196754, -12.871881409, 0), (0, 0, 270))):
            Circle(SKETCH_2_R)
    extrude(amount=-CUT_EXTRUDE_1_DEPTH, mode=Mode.SUBTRACT)

    # Скругление1
    fillet_1_edges = [part.edges().sort_by_distance(p)[0] for p in [
        (-122.220473813, 3, 17.853182906),
        (-99.853084476, 3, 54.031919172),
        (-55.841512263, 3, 19.540243327),
        (39.584708108, 3, 9.950190344),
        (124.070110529, 3, -61.232071167),
        (39.584708108, 3, -61.232071167),
        (55.587438417, 3, 9.543471524),
        (124.94696854, 3, 7.780658197),
        (124.234493737, 3, -48.29436204),
        (39.584708108, 3, 59.568896564),
        (90.997346953, 3, 59.568896564),
        (39.584708108, 3, 19.560609068),
        (144.232879574, 3, -48.548456393),
        (144.945354376, 3, 7.526563843),
        (214.327282353, 3, 7.526563843),
        (-144.232879574, 3, -48.548456393),
        (-214.327282353, 3, 7.526563843),
        (-144.945354376, 3, 7.526563843),
        (-55.587438417, 3, 9.543471524),
        (-124.234493737, 3, -48.29436204),
        (-124.94696854, 3, 7.780658197),
        (-39.584708108, 3, 9.950190344),
        (-39.584708108, 3, -61.232071167),
        (-124.070110529, 3, -61.232071167),
        (0, 3, -61.232071167),
        (-29.584708108, 3, 14.755399706),
        (0, 3, 59.568896564),
        (29.584708108, 3, 14.755399706),
        (-39.584708108, 3, 19.560609068),
        (-90.997346953, 3, 59.568896564),
        (-39.584708108, 3, 59.568896564),
    ]]
    fillet(fillet_1_edges, radius=FILLET_1_R)


solid = part.part
